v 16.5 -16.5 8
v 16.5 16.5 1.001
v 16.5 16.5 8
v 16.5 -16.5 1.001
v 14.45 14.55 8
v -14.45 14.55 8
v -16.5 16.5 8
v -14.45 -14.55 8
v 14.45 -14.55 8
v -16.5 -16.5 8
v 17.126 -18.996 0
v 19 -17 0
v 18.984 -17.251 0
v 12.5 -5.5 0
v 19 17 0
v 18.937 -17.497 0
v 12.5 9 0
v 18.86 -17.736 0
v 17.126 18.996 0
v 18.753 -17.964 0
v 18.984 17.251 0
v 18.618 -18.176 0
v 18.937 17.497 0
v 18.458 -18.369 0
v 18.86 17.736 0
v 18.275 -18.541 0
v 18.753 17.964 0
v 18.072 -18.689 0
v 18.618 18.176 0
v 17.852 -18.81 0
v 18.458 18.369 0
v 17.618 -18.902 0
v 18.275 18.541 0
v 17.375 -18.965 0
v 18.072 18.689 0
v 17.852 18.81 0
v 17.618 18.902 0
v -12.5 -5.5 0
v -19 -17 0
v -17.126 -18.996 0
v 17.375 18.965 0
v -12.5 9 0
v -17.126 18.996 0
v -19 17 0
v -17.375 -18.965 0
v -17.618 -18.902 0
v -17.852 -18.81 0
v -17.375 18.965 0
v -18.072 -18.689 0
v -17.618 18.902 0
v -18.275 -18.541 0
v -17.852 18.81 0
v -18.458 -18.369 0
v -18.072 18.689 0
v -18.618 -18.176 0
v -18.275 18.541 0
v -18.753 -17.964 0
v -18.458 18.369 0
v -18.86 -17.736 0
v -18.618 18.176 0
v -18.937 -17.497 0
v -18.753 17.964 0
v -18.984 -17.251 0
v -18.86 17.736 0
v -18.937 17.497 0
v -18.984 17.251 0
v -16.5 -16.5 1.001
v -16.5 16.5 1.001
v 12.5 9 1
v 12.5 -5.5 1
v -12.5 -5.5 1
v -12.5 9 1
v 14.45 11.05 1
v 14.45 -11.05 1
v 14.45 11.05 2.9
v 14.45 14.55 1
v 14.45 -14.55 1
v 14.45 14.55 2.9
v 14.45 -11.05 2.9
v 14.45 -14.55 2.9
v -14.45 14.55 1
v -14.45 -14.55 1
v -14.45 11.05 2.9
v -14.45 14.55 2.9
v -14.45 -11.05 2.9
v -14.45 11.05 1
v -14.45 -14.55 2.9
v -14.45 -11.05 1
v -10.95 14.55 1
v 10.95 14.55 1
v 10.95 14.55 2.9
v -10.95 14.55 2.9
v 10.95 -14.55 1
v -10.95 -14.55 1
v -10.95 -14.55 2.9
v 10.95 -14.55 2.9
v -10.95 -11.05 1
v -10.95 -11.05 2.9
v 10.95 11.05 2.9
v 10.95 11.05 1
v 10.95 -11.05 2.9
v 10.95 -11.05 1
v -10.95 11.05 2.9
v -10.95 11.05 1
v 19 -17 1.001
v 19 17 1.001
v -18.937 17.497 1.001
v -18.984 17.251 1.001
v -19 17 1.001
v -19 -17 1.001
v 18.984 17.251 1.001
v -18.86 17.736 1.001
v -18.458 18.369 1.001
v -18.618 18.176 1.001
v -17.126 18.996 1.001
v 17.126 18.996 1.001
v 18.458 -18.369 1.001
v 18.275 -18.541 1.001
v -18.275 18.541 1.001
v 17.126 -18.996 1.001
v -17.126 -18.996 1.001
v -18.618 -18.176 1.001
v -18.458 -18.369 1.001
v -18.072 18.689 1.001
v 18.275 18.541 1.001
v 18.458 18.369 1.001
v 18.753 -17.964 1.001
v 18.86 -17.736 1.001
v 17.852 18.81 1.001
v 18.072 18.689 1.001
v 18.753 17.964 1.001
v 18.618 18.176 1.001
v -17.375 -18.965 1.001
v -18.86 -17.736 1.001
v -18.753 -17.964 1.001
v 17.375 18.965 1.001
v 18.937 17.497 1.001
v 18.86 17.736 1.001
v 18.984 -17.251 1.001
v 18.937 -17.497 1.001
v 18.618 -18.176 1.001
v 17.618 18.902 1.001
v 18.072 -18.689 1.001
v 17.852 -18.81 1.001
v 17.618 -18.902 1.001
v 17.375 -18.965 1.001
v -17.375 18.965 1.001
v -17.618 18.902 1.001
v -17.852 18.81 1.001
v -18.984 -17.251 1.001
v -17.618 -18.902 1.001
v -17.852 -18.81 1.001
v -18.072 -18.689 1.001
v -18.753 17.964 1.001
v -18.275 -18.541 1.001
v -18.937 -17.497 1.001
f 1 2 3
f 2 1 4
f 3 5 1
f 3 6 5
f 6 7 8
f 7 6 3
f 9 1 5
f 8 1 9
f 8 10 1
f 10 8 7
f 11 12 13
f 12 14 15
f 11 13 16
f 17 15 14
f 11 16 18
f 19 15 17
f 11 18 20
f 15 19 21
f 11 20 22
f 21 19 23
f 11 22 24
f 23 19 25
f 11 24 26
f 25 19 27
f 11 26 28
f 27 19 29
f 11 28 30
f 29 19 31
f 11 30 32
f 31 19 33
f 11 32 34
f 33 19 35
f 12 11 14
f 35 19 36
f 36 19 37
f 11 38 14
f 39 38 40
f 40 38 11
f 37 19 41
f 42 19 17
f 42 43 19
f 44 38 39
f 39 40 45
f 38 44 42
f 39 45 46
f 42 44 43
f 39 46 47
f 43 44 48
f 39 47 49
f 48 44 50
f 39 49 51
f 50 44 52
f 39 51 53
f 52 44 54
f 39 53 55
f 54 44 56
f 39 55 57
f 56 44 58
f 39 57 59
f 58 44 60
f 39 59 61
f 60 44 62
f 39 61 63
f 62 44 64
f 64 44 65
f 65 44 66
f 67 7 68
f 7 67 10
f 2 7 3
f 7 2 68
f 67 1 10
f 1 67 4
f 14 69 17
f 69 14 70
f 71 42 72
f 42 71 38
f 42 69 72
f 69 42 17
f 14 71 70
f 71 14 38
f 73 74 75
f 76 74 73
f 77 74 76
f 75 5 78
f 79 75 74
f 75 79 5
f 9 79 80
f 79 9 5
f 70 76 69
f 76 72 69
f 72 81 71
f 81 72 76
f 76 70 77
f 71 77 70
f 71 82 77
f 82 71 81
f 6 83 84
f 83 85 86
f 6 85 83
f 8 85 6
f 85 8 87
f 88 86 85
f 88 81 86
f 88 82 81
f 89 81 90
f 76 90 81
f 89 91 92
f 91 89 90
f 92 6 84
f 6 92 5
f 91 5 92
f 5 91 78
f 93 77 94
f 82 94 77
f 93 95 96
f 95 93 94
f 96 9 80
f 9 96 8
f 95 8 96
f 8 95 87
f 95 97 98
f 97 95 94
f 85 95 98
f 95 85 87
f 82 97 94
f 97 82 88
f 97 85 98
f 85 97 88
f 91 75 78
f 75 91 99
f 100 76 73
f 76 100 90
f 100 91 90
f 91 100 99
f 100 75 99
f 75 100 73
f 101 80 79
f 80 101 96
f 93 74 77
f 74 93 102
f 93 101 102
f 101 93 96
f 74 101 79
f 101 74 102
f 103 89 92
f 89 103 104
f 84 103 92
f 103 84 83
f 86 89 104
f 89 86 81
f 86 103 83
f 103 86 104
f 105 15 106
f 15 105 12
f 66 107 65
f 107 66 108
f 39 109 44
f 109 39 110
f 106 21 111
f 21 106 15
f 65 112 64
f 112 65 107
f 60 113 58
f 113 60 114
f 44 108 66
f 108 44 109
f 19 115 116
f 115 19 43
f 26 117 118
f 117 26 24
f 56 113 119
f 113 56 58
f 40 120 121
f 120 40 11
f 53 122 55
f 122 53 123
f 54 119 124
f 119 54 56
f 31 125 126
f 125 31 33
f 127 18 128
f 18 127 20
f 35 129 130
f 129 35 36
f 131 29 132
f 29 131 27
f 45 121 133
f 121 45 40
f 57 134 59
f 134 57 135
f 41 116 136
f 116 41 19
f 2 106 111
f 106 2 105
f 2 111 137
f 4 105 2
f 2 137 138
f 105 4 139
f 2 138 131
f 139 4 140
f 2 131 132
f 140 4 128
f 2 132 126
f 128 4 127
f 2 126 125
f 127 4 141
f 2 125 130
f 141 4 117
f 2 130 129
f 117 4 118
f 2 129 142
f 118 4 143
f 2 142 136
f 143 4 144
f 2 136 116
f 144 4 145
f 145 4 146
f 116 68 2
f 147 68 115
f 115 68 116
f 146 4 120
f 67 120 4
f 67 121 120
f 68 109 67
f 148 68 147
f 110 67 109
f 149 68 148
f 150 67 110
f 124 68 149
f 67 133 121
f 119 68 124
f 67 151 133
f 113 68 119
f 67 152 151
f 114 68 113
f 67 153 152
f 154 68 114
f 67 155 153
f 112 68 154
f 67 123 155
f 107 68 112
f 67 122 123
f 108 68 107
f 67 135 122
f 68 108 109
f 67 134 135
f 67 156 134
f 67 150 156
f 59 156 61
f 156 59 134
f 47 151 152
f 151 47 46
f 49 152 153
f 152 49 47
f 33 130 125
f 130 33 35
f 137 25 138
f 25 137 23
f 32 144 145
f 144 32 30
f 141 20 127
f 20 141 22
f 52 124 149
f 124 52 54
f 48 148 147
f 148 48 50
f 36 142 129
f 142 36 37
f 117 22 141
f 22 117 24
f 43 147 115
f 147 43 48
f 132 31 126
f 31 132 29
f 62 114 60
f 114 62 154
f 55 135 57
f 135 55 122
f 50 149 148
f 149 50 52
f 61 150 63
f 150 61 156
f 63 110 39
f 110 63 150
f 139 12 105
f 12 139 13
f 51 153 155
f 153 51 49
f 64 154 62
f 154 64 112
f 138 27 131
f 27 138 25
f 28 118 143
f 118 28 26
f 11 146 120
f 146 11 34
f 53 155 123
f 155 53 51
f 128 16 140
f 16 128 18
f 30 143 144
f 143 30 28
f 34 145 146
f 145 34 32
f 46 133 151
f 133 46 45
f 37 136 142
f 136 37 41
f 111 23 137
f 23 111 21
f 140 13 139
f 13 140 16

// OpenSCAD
// Bezel for tiny Oled 0.96"
// Stiftleiste ist oben

$fn=50;
CLEARANCE=0.3;

WALL_THICKNESS=2.5;

OLED_XLENGTH=27.6 + CLEARANCE;
OLED_YLENGTH=27.8 + CLEARANCE;
OLED_XLEN_VISIBLE=25;
OLED_YLEN_VISIBLE=14.5;
OLED_FromTopToVisible=5.0+WALL_THICKNESS;

WALL_FRONT=1;
OUTER_LENGTH=WALL_THICKNESS*2 + 28;  // 28 is OLED_XLENGTH rounded up
EDGE_SIZE=4;
EDGE_ZLEN=1.9;
EDGE_PinHeight=0;

BOX_ZLENGTH=8;


module platform(x,y,dx,dy) {
    translate([x,y,WALL_FRONT+EDGE_ZLEN/2]) {
        translate([dx,dy,0]) cube([EDGE_SIZE, EDGE_SIZE, EDGE_ZLEN], center=true);
        cylinder(r1=1,r2=0.4,h=EDGE_PinHeight+EDGE_ZLEN/2);
    }
}

difference() {
    translate([0,0,BOX_ZLENGTH/2])
        cube([OUTER_LENGTH,OUTER_LENGTH,BOX_ZLENGTH], center=true);

    translate([0,OUTER_LENGTH/2 - OLED_YLEN_VISIBLE/2 - OLED_FromTopToVisible, 0])
        cube([OLED_XLEN_VISIBLE,OLED_YLEN_VISIBLE,100], center=true);
    translate([0,0,BOX_ZLENGTH/2 + WALL_FRONT])
    cube([OLED_XLENGTH+1, OLED_YLENGTH+1,BOX_ZLENGTH], center=true);
}

platform(-OLED_XLENGTH/2+EDGE_SIZE/2, -OLED_YLENGTH/2+EDGE_SIZE/2,-1,-1);
platform(OLED_XLENGTH/2-EDGE_SIZE/2, OLED_YLENGTH/2-EDGE_SIZE/2,1,1);
platform(OLED_XLENGTH/2-EDGE_SIZE/2, -OLED_YLENGTH/2+EDGE_SIZE/2,1,-1);
platform(-OLED_XLENGTH/2+EDGE_SIZE/2, OLED_YLENGTH/2-EDGE_SIZE/2,-1,1);

difference() {
    translate([0,0,WALL_FRONT/2])
      minkowski() {
        cube([OUTER_LENGTH+1, OUTER_LENGTH+1, WALL_FRONT], center=true);
        cylinder(r=2, h=0.001);
      }

    cube([OUTER_LENGTH,OUTER_LENGTH,BOX_ZLENGTH], center=true);
}
